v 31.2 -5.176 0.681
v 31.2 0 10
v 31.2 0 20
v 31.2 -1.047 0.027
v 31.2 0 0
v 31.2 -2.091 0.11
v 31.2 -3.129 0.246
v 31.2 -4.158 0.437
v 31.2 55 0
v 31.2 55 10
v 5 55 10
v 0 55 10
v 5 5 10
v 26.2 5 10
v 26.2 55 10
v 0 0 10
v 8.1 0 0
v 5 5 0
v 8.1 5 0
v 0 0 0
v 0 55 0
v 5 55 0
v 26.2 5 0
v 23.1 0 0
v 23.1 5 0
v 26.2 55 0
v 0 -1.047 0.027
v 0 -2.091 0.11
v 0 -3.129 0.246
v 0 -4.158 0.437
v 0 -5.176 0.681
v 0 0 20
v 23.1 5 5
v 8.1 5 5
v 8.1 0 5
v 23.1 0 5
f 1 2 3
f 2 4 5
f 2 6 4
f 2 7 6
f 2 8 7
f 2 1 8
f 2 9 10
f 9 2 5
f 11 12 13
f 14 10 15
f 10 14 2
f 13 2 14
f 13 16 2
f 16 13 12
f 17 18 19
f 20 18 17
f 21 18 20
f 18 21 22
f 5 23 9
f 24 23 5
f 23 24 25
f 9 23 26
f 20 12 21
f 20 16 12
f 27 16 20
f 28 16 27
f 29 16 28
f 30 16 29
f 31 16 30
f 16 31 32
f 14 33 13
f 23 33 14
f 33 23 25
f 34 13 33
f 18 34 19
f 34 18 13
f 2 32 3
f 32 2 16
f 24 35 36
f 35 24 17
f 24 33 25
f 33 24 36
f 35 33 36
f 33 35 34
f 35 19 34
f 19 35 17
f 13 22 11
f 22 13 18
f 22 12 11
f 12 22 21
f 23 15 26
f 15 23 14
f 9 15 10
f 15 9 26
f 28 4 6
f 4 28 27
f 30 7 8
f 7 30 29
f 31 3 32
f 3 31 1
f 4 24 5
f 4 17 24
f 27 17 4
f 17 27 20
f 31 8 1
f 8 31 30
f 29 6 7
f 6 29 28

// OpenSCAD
$fa = 0.4;
$fs = 1;

// Pico Enviro+ Dimensions
enviroWidth = 31.8;
enviroHeight = 61.8;
enviroDepth = 1.8;
pmsWidth = 15;
pmsDepth = 3.6;
qwkWidth = 6.2;
qwkDepth = 2.8;
offsetTop = 6;
offsetBottom = 1.6;

// Pico Dimensions
picoWidth = 21.2;
picoHeight = 51.2;
picoDepth = 1;
usbWidth = 11;
usbDepth = 4.2;
pinDepth = 8.4;

// Overall Dimensions
maxWidth = 32;
maxHeight = 62;
maxDepth = 20;

// Nouveau
strutWidth = 5;
strutHeight = 55;
strutDepth = 10;
baseDepth = 2;

module strut() {
  cube ([strutWidth, strutHeight, strutDepth]);
}

render () {
  strut();

  translate ([picoWidth + strutWidth, 0, 0]) {
    strut();
  }

  difference () {
    cube ([picoWidth + (2 * strutWidth), strutWidth, strutDepth]);

    translate([strutWidth + ((picoWidth - pmsWidth) / 2), 0, 0]) {
      cube ([pmsWidth, strutWidth, strutWidth]);
    }
  }

  translate ([picoWidth + (2 * strutWidth), 0, 2 * strutDepth]) {
    rotate ([180, 90, 0]) {
      rotate_extrude (angle = 15) {
        square ([2 * strutDepth, picoWidth + (2 * strutWidth)]);
      }
    }
  }
}
